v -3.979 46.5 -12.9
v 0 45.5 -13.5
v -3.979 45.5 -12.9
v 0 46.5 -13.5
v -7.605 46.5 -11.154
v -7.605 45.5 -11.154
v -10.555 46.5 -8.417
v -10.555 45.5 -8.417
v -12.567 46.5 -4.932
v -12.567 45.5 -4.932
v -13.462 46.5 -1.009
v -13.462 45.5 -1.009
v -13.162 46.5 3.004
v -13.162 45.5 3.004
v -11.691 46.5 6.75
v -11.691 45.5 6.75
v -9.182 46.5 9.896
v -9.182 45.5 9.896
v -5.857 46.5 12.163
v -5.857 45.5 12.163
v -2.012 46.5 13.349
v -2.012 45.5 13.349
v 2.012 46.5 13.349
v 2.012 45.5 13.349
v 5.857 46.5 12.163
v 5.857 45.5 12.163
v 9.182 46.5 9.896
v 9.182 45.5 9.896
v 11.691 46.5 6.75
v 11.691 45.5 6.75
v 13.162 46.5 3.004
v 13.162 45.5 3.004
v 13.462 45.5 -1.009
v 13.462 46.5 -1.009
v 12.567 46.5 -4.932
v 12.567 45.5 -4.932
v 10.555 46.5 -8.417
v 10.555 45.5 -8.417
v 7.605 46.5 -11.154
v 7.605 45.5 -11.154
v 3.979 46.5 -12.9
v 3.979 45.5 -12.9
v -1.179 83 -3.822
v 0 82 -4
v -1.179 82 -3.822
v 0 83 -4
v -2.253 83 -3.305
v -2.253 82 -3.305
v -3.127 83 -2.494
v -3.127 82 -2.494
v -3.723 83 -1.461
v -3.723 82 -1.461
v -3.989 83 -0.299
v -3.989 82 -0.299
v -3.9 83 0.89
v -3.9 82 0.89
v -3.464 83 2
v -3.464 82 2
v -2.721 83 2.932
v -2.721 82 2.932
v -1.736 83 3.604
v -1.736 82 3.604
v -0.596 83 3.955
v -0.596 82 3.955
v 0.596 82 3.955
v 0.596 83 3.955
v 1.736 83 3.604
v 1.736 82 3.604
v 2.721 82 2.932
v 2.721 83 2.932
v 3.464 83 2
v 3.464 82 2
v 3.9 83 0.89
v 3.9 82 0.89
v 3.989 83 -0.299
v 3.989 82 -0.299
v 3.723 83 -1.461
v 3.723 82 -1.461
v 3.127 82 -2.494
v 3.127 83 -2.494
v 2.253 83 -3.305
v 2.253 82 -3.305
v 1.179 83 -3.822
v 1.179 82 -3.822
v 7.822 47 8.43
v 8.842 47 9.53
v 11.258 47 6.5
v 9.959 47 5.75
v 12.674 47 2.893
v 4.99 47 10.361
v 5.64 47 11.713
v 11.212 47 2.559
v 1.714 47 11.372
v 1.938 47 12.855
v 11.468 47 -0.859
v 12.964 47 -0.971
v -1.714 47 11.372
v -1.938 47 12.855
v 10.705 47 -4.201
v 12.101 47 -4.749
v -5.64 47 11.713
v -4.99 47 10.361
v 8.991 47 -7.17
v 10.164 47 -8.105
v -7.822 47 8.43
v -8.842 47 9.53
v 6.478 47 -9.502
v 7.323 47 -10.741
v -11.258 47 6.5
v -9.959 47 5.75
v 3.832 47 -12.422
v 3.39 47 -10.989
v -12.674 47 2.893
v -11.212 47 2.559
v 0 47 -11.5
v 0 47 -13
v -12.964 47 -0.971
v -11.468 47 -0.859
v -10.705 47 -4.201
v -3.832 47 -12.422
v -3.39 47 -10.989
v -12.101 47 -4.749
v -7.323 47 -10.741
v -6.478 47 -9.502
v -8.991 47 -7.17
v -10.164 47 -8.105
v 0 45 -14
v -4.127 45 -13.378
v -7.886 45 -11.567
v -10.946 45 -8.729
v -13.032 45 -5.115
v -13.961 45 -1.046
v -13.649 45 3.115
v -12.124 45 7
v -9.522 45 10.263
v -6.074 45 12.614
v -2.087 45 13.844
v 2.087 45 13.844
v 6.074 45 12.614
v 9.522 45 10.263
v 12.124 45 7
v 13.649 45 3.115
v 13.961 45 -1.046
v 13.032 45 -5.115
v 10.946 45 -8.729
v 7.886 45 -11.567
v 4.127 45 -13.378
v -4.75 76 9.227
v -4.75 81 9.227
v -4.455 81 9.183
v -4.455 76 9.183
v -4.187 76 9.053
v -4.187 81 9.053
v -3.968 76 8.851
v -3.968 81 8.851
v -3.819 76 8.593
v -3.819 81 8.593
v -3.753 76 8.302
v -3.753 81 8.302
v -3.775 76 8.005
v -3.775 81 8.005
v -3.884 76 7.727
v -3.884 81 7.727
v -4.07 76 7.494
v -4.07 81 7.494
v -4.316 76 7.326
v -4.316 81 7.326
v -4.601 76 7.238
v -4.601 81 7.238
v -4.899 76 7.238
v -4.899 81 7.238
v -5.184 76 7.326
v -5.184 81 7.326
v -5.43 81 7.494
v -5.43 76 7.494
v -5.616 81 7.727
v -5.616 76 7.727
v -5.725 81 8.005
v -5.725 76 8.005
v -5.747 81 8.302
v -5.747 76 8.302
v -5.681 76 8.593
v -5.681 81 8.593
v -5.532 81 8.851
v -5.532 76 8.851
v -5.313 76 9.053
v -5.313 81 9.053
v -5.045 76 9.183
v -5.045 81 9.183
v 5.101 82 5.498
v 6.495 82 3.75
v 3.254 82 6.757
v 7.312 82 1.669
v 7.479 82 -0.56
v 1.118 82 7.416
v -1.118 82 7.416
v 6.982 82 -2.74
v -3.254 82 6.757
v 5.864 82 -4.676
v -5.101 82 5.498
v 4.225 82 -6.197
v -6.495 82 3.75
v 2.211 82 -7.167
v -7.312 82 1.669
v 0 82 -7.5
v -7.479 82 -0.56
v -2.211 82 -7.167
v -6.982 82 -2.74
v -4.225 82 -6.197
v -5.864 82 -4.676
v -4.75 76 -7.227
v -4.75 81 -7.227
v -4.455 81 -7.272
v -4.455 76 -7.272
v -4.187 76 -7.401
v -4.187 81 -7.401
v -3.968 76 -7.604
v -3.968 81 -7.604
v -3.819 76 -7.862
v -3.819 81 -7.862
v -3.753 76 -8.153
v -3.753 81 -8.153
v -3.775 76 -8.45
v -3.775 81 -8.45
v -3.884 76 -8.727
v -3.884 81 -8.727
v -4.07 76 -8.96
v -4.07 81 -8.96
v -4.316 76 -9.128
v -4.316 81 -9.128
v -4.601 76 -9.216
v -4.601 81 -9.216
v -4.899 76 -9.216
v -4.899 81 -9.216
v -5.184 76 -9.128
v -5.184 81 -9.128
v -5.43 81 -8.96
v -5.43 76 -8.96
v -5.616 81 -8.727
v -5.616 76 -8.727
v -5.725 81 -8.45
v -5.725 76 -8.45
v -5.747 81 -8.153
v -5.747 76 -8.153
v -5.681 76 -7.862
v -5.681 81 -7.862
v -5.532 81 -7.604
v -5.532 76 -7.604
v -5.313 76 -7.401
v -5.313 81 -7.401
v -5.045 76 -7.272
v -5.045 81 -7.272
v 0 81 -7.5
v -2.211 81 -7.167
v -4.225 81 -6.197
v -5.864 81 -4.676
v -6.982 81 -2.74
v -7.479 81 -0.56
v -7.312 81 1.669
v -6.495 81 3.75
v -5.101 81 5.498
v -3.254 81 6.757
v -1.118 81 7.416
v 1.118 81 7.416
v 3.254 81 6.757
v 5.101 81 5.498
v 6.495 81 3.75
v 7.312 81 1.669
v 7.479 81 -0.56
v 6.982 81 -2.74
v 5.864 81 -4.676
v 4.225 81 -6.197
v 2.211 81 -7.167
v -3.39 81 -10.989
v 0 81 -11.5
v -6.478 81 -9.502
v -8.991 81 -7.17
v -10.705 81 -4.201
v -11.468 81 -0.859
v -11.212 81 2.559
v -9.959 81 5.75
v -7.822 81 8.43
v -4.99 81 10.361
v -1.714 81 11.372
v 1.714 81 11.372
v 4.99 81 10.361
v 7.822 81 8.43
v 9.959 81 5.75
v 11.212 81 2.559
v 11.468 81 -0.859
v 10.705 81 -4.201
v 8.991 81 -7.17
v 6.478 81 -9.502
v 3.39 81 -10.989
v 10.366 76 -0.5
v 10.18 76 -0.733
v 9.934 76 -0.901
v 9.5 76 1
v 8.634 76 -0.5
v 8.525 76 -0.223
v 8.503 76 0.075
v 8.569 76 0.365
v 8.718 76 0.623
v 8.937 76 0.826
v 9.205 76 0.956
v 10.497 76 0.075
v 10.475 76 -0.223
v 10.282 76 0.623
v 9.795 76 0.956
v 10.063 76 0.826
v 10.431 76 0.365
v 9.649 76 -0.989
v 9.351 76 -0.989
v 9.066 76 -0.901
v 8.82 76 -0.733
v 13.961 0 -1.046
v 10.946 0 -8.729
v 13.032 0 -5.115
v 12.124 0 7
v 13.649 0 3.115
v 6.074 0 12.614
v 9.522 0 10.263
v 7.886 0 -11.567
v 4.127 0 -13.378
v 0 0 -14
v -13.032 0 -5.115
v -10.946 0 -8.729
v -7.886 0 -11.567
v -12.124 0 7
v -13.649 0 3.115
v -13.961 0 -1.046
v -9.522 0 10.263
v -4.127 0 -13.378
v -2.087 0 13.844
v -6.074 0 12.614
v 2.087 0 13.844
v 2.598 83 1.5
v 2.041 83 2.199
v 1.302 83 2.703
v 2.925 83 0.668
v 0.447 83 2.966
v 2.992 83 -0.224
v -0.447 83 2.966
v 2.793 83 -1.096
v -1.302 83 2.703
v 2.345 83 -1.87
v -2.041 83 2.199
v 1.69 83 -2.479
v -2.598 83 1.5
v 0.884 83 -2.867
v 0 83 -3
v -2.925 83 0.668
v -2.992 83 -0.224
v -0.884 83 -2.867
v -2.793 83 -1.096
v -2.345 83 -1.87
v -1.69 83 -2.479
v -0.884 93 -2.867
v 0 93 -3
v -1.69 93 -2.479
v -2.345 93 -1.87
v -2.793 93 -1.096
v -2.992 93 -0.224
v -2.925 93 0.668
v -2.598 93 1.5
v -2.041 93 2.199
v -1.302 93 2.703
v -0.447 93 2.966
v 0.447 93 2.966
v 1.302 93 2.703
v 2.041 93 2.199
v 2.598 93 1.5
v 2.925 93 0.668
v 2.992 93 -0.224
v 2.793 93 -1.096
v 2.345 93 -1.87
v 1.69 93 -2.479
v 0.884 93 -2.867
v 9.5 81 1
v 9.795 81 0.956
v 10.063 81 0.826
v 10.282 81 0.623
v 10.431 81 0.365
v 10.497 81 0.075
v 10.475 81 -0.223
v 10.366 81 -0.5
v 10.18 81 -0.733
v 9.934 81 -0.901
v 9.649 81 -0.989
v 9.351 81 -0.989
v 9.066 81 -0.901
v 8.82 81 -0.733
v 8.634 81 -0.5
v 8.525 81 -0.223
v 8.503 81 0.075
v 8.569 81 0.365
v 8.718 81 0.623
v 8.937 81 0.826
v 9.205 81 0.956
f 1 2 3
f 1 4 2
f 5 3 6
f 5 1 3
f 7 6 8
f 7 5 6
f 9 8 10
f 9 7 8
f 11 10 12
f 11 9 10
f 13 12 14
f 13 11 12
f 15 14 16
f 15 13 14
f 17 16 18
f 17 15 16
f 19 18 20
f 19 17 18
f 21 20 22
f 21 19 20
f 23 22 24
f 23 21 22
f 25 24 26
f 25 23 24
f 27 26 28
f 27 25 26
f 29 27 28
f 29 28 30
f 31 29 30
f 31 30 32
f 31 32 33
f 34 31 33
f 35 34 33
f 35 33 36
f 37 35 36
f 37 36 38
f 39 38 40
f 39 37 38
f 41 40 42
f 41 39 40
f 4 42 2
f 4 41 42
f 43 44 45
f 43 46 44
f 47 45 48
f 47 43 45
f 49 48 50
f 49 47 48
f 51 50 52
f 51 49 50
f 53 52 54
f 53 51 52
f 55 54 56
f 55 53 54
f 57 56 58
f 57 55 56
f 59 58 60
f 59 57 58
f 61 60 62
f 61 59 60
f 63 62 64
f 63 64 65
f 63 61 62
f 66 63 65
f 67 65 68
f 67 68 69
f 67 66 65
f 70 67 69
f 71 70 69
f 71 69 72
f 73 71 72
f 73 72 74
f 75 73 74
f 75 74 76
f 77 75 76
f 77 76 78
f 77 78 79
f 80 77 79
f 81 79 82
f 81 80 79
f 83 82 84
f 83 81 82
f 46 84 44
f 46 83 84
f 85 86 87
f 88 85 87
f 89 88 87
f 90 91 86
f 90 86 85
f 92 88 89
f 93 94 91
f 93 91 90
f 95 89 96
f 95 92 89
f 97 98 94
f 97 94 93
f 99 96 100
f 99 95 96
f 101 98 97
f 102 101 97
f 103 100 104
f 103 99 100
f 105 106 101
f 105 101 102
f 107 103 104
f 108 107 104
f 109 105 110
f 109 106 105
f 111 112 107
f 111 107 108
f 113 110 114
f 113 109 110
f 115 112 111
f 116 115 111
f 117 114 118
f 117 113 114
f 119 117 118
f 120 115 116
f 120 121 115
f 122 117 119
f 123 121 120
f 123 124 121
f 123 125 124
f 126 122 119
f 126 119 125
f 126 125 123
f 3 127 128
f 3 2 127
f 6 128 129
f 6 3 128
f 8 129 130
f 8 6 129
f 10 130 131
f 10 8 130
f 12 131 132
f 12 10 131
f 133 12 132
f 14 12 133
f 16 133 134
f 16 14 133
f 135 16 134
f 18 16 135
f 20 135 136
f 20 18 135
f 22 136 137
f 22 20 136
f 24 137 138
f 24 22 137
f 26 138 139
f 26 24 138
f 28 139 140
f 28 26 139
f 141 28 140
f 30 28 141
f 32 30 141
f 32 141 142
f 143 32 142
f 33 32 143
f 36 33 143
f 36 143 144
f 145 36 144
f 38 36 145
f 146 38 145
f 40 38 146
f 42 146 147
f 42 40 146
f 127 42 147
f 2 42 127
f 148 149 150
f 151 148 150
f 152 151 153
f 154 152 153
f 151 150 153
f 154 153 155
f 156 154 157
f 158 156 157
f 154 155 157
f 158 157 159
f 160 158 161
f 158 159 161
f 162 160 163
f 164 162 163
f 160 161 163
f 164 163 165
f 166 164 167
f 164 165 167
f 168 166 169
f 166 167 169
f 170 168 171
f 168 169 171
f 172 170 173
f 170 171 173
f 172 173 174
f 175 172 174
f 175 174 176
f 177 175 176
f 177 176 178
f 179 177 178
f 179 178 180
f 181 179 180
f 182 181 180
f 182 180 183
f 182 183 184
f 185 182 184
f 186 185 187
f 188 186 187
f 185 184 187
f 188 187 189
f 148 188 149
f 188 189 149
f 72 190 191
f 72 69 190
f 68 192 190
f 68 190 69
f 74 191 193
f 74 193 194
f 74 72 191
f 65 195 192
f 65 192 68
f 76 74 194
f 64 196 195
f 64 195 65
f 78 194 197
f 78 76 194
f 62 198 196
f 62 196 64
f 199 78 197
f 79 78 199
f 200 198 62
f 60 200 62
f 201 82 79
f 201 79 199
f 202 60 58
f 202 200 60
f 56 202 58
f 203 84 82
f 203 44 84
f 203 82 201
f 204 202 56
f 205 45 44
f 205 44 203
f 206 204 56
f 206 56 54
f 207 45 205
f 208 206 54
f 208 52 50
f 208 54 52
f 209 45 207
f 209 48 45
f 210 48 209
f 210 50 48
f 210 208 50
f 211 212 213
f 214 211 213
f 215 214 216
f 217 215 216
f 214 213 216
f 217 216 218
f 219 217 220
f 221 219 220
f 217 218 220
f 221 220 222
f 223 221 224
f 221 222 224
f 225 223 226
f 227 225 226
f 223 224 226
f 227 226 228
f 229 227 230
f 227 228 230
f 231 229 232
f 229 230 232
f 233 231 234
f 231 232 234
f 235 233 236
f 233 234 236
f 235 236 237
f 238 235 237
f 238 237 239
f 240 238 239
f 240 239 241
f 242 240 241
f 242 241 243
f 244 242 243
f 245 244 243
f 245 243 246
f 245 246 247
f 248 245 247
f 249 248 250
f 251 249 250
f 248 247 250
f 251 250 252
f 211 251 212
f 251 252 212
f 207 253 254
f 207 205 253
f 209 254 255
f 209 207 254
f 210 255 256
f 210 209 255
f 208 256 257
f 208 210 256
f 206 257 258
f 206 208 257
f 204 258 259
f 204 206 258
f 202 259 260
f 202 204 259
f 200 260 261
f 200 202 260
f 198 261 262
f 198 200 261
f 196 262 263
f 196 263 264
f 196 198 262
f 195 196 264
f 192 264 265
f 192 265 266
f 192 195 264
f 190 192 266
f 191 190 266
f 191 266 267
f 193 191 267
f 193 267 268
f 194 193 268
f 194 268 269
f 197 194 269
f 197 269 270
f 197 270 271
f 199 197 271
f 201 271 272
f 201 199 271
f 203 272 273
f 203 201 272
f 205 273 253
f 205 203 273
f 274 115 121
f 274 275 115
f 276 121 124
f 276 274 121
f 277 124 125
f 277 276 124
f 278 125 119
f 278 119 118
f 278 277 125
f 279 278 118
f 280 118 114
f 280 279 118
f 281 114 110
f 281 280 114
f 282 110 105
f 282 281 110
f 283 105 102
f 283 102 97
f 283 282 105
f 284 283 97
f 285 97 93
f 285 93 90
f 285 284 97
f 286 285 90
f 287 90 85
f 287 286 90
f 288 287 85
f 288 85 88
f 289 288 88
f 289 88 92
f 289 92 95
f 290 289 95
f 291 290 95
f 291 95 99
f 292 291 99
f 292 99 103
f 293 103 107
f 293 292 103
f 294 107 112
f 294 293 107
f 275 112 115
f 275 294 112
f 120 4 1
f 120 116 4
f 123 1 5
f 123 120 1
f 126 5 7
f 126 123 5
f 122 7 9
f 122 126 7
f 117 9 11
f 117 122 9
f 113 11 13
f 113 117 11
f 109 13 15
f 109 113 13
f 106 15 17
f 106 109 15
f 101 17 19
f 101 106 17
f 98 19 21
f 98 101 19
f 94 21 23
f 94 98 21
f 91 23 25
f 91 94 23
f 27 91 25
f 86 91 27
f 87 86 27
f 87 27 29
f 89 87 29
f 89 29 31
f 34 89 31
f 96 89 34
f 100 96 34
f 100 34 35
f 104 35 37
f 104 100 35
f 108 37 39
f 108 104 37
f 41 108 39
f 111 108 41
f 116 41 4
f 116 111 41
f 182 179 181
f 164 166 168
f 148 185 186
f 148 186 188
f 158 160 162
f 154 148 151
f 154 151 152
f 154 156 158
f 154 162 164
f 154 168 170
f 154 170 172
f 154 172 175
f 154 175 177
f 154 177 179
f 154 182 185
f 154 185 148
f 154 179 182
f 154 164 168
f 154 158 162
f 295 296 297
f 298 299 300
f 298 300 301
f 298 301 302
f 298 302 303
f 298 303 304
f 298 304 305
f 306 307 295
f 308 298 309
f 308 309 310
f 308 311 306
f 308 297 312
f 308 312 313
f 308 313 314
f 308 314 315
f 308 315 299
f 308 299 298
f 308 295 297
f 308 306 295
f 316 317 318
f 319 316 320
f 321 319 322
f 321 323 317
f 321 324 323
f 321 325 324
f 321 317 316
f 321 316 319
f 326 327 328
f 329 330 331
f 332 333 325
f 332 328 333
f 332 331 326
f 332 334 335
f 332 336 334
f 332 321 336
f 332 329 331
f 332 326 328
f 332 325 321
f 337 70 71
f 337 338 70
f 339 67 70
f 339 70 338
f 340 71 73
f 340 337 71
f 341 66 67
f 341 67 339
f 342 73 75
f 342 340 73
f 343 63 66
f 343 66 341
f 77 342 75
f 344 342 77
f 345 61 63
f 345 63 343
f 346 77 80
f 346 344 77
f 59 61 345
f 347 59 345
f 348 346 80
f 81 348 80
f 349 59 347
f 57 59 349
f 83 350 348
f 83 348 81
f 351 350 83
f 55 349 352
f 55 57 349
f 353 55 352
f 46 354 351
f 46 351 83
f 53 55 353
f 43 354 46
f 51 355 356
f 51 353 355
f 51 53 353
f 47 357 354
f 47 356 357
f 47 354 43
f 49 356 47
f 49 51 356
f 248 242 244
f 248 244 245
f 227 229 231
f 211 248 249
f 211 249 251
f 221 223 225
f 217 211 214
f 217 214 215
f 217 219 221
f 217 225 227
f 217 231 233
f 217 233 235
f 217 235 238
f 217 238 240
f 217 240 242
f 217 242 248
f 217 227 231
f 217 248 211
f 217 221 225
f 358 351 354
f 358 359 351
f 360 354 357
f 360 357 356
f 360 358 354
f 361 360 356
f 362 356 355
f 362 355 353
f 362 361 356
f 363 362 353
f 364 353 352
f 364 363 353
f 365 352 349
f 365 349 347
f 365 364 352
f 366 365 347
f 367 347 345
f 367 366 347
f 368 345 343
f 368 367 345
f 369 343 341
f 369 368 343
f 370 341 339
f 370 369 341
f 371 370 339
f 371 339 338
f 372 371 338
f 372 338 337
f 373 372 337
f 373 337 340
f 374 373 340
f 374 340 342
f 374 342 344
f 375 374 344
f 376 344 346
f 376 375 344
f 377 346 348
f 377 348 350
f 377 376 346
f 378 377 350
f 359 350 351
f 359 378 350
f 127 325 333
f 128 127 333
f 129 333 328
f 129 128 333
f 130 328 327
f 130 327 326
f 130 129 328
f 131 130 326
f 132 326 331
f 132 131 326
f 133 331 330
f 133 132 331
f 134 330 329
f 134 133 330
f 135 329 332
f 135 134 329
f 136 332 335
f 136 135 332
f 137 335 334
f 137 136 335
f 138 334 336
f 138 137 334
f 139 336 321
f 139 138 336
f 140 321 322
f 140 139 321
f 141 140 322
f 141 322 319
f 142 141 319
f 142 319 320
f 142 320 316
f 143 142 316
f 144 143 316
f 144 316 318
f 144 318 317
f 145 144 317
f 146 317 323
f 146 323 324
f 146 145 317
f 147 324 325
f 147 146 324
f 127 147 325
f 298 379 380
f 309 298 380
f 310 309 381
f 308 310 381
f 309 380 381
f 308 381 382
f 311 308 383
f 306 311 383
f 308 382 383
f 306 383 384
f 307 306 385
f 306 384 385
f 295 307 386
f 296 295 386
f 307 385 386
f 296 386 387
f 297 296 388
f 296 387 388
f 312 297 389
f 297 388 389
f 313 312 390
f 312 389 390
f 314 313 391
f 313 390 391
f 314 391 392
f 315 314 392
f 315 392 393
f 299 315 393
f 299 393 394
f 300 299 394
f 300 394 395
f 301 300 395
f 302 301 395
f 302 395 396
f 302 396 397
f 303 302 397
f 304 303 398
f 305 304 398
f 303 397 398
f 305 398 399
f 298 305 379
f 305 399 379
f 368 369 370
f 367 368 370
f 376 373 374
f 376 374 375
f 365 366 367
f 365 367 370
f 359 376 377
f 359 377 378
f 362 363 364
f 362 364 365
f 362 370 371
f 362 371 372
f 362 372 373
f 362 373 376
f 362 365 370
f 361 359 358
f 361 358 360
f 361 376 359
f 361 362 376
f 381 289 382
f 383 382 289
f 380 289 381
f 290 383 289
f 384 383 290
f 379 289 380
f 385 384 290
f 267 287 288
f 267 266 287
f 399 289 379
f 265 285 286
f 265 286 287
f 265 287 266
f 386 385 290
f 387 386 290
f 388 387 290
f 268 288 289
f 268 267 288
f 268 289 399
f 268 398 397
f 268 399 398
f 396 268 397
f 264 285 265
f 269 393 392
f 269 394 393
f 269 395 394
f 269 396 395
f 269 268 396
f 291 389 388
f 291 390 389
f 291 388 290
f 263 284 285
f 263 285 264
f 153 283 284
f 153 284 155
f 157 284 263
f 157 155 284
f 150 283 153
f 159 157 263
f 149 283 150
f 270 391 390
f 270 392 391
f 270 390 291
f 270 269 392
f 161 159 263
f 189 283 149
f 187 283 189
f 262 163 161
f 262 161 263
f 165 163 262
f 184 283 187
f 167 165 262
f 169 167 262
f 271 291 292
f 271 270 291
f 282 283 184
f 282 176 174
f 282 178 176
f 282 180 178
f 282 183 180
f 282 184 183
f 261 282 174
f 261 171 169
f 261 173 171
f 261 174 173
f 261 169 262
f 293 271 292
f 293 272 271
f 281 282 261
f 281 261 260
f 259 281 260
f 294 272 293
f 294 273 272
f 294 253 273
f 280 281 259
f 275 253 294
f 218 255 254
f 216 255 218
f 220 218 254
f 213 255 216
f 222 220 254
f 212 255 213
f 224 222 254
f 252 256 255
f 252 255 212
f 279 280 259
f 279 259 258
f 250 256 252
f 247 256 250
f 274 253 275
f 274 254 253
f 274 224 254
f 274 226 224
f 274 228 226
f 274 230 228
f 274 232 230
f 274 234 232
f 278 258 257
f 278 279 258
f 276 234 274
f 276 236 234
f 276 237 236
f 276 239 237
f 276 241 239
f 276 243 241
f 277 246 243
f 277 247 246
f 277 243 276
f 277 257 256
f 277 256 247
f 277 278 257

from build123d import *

# Parameters (mm, degrees)
ESQUISSE3_R             = 1
ENL_V_MAT_EXTRU_1_DEPTH = 5


with BuildPart() as part:
    # Esquisse1 → Révolution1 (revolve)
    with BuildSketch(Plane.XY, mode=Mode.PRIVATE) as r_volution1_sk:
        Polygon((0, 0), (14, 0), (14, 17), (14, 45), (13.5, 45.5), (13.5, 46.5), (13, 47), (11.5, 47), (11.5, 81), (7.5, 81), (7.5, 82), (4, 82), (4, 83), (3, 83), (3, 93), (0, 93), align=None)
    revolve(r_volution1_sk.sketch.rotate(Axis((0, 0, 0), (0, 1, 0)), 90), axis=Axis((0, 0, 0), (0, 1, 0)))

    # Esquisse3 → Enlèv. mat.-Extru.1 (cut)
    with BuildSketch(Plane(origin=(0, 81, 0), x_dir=(1, 0, 0), z_dir=(0, 1, 0))):
        with Locations(Location((9.5, 0, 0), (0, 0, 270))):
            Circle(ESQUISSE3_R)
        with Locations(Location((-4.75, -8.227241336, 0), (0, 0, 270))):
            Circle(ESQUISSE3_R)
        with Locations(Location((-4.75, 8.227241336, 0), (0, 0, 270))):
            Circle(ESQUISSE3_R)
    extrude(amount=-ENL_V_MAT_EXTRU_1_DEPTH, mode=Mode.SUBTRACT)


solid = part.part
